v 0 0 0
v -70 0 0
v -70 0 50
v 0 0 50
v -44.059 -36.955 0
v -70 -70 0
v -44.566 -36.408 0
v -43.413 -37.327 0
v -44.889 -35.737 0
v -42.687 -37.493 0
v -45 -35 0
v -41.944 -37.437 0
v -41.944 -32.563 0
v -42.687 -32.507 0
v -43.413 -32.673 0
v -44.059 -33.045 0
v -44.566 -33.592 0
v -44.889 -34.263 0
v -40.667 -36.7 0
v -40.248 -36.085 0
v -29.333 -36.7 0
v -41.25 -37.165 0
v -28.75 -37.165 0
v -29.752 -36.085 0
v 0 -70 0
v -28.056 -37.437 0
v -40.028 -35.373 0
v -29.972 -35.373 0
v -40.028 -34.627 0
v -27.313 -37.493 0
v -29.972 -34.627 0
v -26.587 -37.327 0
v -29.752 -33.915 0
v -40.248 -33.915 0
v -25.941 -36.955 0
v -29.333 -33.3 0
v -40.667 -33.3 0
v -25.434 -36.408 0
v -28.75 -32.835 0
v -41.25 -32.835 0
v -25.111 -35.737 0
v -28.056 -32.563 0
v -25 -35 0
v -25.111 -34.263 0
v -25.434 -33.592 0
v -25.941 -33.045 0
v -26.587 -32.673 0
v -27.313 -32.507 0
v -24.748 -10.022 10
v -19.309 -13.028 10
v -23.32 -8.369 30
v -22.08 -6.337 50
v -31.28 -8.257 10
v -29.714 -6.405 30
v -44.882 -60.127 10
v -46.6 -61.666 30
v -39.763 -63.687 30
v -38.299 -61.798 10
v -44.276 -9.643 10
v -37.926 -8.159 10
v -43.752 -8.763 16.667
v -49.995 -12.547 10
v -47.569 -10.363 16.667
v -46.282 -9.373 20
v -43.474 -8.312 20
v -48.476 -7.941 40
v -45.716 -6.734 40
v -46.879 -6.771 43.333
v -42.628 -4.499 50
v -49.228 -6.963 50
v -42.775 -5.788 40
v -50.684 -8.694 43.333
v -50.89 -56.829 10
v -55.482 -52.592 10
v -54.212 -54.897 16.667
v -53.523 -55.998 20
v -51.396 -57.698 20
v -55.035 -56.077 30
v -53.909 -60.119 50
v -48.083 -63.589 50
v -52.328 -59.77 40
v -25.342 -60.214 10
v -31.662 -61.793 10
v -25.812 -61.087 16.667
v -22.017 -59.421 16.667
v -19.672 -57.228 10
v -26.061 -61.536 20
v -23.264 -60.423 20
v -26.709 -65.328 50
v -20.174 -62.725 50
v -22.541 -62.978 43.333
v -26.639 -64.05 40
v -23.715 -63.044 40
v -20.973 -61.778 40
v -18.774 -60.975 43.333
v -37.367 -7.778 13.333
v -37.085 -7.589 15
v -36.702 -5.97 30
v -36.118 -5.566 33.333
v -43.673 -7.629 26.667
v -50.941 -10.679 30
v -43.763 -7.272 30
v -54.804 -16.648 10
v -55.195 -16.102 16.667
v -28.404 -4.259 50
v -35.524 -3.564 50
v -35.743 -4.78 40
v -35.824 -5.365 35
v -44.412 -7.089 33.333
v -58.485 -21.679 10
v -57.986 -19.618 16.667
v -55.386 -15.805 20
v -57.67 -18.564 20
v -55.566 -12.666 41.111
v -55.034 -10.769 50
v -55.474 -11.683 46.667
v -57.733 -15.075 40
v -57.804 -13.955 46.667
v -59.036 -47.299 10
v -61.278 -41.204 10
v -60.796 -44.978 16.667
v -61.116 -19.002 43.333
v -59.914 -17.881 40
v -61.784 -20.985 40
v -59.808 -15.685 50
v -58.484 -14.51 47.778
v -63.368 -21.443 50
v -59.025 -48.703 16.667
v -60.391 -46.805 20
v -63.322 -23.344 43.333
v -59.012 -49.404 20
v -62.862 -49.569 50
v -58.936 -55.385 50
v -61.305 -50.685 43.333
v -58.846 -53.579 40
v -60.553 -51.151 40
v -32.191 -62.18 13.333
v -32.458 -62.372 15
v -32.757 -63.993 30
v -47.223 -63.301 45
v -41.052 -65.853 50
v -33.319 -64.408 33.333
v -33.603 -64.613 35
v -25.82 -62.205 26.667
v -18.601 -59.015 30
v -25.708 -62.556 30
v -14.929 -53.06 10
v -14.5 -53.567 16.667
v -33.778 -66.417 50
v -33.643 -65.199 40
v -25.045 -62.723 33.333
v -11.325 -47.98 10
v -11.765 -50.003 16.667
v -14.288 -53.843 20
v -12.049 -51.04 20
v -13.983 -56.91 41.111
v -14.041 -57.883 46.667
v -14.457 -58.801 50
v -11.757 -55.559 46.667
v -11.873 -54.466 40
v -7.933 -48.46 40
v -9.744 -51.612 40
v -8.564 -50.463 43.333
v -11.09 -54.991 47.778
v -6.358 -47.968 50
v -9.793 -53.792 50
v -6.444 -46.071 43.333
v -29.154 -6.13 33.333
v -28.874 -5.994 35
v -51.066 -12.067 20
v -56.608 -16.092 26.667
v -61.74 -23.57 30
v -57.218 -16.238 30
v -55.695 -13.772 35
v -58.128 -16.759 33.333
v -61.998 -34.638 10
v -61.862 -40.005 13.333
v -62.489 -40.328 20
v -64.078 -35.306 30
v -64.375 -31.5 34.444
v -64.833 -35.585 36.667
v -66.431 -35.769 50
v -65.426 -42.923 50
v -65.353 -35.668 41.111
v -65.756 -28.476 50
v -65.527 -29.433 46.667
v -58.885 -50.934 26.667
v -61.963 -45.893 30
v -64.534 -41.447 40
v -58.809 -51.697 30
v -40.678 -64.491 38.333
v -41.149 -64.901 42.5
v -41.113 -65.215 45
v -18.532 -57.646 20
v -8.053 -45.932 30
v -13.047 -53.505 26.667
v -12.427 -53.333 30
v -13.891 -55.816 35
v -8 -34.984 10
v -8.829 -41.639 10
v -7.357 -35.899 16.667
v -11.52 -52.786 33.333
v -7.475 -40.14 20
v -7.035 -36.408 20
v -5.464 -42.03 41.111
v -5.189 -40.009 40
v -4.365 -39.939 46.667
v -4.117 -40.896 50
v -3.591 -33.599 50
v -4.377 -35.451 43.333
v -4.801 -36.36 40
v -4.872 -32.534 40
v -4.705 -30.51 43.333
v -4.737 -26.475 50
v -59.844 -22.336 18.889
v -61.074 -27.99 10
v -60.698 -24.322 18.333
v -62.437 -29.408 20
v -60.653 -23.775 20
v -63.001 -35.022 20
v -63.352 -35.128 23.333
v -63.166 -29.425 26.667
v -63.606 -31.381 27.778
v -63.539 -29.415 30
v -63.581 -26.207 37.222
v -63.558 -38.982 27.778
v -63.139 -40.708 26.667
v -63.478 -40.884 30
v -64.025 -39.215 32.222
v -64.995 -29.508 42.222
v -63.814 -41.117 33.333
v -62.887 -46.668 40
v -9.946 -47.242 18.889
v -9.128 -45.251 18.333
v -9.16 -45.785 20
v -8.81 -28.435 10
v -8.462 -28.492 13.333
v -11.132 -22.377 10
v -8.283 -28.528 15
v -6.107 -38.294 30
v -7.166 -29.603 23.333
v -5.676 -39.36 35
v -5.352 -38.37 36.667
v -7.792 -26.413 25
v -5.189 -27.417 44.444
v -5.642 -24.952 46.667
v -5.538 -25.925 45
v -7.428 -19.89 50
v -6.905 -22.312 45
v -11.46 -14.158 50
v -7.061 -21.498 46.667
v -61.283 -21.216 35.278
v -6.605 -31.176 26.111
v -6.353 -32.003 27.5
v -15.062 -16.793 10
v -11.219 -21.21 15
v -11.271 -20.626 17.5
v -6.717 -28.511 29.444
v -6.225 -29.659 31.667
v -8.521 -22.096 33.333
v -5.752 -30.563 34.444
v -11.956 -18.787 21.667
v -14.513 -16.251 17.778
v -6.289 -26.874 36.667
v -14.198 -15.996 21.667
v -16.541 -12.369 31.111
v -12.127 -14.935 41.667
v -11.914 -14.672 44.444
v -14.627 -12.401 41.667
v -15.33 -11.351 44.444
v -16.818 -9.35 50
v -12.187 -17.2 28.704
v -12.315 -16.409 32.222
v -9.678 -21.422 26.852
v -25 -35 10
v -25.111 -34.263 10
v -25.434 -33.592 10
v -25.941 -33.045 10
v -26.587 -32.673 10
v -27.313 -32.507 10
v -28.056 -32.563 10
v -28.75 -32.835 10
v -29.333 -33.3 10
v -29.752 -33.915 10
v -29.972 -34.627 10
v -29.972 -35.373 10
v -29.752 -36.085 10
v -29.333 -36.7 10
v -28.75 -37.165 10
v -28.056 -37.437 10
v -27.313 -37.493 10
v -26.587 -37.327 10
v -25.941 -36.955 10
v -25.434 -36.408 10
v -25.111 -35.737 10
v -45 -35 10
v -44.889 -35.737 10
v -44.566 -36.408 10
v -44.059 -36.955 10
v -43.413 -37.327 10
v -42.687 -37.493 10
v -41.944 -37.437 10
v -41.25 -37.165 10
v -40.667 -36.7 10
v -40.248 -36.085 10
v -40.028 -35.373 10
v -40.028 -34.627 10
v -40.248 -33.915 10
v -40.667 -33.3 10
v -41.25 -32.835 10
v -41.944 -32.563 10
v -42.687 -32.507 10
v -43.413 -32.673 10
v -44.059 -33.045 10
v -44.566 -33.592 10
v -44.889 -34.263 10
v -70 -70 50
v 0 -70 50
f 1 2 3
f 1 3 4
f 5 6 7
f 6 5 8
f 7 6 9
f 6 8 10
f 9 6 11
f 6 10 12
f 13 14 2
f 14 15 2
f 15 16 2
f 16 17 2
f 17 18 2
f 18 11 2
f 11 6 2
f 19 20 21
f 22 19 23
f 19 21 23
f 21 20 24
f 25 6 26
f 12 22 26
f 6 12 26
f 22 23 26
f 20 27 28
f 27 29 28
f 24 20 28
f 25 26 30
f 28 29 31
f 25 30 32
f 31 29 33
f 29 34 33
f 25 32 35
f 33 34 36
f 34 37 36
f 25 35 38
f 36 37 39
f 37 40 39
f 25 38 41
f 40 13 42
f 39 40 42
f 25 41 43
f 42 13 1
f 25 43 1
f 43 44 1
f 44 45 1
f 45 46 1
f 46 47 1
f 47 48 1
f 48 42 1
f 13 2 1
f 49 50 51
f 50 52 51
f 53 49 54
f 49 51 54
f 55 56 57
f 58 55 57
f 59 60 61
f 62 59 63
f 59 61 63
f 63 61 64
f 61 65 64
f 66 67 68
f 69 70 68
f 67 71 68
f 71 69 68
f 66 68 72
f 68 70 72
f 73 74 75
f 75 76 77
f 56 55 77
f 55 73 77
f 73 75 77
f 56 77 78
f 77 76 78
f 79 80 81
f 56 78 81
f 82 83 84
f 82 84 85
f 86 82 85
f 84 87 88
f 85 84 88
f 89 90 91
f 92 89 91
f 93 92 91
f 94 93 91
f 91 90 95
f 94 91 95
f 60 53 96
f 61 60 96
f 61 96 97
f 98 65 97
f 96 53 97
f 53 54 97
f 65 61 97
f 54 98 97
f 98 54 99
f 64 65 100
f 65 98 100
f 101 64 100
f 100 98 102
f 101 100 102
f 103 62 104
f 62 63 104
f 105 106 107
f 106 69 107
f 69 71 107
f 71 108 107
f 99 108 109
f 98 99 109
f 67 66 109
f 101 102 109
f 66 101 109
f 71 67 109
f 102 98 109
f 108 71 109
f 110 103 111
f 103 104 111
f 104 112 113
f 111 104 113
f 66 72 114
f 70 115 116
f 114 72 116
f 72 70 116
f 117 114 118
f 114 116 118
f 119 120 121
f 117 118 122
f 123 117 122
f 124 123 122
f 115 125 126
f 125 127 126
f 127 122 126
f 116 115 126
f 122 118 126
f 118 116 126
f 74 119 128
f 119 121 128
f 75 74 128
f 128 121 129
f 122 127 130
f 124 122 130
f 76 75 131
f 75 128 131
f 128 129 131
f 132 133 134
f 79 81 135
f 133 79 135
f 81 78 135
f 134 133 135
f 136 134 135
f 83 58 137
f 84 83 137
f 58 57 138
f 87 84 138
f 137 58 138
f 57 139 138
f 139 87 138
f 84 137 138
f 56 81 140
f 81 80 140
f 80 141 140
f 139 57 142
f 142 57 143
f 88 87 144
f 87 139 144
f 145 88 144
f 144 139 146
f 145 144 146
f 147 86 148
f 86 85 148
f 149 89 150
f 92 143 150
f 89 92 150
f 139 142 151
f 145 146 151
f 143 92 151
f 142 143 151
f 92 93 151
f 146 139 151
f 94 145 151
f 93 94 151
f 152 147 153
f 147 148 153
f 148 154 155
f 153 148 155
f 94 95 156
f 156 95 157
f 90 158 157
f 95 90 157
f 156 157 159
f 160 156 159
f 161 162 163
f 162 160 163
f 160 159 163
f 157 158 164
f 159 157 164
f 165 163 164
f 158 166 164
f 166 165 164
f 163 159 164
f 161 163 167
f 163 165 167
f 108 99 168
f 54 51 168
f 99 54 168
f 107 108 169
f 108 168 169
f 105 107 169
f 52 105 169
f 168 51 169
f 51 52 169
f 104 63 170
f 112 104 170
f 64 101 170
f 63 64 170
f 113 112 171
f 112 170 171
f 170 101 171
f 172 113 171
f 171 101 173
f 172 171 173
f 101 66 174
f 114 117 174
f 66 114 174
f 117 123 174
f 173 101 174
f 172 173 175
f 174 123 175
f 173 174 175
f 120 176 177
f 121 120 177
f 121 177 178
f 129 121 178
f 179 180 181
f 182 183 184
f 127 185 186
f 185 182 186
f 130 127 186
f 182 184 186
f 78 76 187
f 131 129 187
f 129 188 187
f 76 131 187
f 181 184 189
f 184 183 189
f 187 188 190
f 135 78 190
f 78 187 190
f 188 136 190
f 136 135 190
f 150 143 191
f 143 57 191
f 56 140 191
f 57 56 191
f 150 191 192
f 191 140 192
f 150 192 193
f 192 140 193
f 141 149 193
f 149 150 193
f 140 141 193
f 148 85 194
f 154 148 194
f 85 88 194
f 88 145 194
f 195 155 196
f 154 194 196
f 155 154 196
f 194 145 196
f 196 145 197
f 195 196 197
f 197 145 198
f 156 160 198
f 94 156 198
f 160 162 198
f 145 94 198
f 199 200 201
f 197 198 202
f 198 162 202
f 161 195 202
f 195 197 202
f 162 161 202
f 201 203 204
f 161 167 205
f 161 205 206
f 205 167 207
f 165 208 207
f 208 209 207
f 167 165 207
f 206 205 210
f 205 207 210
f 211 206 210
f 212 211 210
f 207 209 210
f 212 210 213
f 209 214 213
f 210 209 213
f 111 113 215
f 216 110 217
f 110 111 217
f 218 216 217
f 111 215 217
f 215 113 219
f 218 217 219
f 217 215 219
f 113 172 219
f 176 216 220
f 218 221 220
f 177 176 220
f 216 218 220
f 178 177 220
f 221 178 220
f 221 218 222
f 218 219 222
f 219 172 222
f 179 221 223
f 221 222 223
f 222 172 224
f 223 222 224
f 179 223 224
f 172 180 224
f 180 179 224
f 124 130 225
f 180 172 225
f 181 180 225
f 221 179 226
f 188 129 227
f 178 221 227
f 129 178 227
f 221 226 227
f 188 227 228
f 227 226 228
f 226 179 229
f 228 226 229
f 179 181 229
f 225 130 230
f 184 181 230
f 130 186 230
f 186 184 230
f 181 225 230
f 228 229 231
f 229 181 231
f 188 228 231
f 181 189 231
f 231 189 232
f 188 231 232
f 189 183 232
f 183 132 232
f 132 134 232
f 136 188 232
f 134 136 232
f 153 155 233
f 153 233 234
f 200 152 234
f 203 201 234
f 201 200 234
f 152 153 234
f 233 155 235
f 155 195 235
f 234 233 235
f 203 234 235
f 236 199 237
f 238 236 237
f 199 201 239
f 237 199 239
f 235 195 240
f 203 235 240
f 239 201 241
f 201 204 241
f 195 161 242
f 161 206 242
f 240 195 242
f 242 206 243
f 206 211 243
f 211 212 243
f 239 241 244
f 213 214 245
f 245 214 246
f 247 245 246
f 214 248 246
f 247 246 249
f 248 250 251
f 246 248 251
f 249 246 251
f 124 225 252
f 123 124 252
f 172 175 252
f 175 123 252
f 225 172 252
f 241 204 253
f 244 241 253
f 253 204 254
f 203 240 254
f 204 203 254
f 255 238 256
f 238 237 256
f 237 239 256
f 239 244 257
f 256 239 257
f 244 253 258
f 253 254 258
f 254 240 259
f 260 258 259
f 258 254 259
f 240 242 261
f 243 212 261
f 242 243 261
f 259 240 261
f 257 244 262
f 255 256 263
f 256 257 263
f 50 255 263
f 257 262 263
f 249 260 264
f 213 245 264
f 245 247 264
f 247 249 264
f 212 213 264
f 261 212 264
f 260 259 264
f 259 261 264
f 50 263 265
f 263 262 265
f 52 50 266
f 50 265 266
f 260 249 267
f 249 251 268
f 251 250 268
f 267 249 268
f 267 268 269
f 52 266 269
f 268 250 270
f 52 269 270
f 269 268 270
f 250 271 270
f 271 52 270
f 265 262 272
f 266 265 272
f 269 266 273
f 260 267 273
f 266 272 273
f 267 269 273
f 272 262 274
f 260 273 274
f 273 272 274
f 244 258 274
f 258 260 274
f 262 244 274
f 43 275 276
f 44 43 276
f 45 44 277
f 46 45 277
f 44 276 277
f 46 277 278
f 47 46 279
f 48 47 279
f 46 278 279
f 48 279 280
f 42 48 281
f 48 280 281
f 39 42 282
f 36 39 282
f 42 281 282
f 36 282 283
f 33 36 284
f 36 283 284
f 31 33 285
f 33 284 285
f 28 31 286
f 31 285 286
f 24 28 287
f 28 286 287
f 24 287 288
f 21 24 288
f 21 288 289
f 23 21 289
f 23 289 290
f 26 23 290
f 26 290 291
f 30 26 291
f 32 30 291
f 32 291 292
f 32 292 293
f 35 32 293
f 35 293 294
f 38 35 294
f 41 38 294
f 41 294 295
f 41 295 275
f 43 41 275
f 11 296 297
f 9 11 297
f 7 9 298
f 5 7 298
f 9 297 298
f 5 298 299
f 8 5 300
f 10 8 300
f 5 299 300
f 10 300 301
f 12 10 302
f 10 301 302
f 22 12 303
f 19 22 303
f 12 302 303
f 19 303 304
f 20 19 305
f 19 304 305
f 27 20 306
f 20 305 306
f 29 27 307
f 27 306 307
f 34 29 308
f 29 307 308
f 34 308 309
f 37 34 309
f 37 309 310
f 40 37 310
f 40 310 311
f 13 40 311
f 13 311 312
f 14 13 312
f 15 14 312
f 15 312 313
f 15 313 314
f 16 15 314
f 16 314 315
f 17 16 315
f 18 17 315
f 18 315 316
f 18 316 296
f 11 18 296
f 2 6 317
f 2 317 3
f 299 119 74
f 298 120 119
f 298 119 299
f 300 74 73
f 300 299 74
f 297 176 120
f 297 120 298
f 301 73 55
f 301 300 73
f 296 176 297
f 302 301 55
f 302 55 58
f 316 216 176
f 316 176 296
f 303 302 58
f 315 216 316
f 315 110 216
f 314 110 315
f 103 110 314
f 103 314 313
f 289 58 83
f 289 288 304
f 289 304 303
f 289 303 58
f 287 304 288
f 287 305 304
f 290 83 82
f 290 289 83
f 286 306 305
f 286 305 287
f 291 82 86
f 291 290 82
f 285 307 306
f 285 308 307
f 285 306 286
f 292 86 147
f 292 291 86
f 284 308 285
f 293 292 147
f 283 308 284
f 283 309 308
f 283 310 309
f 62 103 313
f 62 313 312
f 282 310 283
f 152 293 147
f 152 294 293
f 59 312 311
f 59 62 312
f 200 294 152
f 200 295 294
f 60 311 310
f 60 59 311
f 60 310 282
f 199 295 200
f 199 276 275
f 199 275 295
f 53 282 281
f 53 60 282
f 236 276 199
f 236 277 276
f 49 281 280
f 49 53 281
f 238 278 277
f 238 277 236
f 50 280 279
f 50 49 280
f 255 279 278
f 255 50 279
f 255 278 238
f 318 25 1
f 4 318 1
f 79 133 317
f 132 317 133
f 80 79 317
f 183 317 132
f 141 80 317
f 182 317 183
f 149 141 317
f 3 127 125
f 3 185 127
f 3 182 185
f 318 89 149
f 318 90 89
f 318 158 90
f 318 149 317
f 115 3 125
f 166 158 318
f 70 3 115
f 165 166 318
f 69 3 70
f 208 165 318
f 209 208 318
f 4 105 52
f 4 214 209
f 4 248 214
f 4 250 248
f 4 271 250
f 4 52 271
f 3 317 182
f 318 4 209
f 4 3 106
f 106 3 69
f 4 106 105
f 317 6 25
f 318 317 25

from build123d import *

# Parameters (mm, degrees)
SKETCH1_W           = 70
SKETCH1_H           = 70
BOSS_EXTRUDE1_DEPTH = 50
SKETCH8_R           = 2.5
CUT_EXTRUDE1_DEPTH  = 50


with BuildPart() as part:
    # Sketch1 → Boss-Extrude1 (new body)
    with BuildSketch(Plane.XY):
        with Locations((-35, -35)):
            Rectangle(SKETCH1_W, SKETCH1_H)
    extrude(amount=BOSS_EXTRUDE1_DEPTH)

    # Cut-Loft1: read off the stored shape, not the designer's step
    # Cut-Loft1: loft between two sections, ruled curve by curve
    cut_loft1_from = [
        Edge.make_bspline([(-19.308746069, -13.027641226, 10), (-63.253463616, 18.354866636, 10), (-94.635971478, -25.589850912, 10), (-50.691253931, -56.972358774, 10), (-6.746536384, -88.354866636, 10), (24.635971478, -44.410149088, 10), (-19.308746069, -13.027641226, 10)], [0, 0, 0, 0, 0.5, 0.5, 0.5, 1, 1, 1, 1], 3, [1, 0.333333333, 0.333333333, 1, 0.333333333, 0.333333333, 1]),
    ]
    cut_loft1_to = [
        Edge.make_bspline([(-22.079724584, -6.336756909, 50), (-79.406210767, 19.503793923, 50), (-105.246761599, -37.82269226, 50), (-47.920275416, -63.663243091, 50), (9.406210767, -89.503793923, 50), (35.246761599, -32.17730774, 50), (-22.079724584, -6.336756909, 50)], [0, 0, 0, 0, 0.5, 0.5, 0.5, 1, 1, 1, 1], 3, [1, 0.333333333, 0.333333333, 1, 0.333333333, 0.333333333, 1]),
    ]
    cut_loft1 = Solid(Shell([*[Face.make_surface_from_curves(cut_loft1_from[k], cut_loft1_to[k]) for k in range(1)], Face(Wire(cut_loft1_from)), Face(Wire(cut_loft1_to))]))
    add(cut_loft1, mode=Mode.SUBTRACT)

    # Sketch8 → Cut-Extrude1 (cut)
    with BuildSketch(Plane.XY.offset(10)):
        with Locations((-27.5, -35)):
            Circle(SKETCH8_R)
        with Locations(Location((-42.5, -35, 0), (0, 0, 180))):
            Circle(SKETCH8_R)
    extrude(amount=-CUT_EXTRUDE1_DEPTH, mode=Mode.SUBTRACT)


solid = part.part
